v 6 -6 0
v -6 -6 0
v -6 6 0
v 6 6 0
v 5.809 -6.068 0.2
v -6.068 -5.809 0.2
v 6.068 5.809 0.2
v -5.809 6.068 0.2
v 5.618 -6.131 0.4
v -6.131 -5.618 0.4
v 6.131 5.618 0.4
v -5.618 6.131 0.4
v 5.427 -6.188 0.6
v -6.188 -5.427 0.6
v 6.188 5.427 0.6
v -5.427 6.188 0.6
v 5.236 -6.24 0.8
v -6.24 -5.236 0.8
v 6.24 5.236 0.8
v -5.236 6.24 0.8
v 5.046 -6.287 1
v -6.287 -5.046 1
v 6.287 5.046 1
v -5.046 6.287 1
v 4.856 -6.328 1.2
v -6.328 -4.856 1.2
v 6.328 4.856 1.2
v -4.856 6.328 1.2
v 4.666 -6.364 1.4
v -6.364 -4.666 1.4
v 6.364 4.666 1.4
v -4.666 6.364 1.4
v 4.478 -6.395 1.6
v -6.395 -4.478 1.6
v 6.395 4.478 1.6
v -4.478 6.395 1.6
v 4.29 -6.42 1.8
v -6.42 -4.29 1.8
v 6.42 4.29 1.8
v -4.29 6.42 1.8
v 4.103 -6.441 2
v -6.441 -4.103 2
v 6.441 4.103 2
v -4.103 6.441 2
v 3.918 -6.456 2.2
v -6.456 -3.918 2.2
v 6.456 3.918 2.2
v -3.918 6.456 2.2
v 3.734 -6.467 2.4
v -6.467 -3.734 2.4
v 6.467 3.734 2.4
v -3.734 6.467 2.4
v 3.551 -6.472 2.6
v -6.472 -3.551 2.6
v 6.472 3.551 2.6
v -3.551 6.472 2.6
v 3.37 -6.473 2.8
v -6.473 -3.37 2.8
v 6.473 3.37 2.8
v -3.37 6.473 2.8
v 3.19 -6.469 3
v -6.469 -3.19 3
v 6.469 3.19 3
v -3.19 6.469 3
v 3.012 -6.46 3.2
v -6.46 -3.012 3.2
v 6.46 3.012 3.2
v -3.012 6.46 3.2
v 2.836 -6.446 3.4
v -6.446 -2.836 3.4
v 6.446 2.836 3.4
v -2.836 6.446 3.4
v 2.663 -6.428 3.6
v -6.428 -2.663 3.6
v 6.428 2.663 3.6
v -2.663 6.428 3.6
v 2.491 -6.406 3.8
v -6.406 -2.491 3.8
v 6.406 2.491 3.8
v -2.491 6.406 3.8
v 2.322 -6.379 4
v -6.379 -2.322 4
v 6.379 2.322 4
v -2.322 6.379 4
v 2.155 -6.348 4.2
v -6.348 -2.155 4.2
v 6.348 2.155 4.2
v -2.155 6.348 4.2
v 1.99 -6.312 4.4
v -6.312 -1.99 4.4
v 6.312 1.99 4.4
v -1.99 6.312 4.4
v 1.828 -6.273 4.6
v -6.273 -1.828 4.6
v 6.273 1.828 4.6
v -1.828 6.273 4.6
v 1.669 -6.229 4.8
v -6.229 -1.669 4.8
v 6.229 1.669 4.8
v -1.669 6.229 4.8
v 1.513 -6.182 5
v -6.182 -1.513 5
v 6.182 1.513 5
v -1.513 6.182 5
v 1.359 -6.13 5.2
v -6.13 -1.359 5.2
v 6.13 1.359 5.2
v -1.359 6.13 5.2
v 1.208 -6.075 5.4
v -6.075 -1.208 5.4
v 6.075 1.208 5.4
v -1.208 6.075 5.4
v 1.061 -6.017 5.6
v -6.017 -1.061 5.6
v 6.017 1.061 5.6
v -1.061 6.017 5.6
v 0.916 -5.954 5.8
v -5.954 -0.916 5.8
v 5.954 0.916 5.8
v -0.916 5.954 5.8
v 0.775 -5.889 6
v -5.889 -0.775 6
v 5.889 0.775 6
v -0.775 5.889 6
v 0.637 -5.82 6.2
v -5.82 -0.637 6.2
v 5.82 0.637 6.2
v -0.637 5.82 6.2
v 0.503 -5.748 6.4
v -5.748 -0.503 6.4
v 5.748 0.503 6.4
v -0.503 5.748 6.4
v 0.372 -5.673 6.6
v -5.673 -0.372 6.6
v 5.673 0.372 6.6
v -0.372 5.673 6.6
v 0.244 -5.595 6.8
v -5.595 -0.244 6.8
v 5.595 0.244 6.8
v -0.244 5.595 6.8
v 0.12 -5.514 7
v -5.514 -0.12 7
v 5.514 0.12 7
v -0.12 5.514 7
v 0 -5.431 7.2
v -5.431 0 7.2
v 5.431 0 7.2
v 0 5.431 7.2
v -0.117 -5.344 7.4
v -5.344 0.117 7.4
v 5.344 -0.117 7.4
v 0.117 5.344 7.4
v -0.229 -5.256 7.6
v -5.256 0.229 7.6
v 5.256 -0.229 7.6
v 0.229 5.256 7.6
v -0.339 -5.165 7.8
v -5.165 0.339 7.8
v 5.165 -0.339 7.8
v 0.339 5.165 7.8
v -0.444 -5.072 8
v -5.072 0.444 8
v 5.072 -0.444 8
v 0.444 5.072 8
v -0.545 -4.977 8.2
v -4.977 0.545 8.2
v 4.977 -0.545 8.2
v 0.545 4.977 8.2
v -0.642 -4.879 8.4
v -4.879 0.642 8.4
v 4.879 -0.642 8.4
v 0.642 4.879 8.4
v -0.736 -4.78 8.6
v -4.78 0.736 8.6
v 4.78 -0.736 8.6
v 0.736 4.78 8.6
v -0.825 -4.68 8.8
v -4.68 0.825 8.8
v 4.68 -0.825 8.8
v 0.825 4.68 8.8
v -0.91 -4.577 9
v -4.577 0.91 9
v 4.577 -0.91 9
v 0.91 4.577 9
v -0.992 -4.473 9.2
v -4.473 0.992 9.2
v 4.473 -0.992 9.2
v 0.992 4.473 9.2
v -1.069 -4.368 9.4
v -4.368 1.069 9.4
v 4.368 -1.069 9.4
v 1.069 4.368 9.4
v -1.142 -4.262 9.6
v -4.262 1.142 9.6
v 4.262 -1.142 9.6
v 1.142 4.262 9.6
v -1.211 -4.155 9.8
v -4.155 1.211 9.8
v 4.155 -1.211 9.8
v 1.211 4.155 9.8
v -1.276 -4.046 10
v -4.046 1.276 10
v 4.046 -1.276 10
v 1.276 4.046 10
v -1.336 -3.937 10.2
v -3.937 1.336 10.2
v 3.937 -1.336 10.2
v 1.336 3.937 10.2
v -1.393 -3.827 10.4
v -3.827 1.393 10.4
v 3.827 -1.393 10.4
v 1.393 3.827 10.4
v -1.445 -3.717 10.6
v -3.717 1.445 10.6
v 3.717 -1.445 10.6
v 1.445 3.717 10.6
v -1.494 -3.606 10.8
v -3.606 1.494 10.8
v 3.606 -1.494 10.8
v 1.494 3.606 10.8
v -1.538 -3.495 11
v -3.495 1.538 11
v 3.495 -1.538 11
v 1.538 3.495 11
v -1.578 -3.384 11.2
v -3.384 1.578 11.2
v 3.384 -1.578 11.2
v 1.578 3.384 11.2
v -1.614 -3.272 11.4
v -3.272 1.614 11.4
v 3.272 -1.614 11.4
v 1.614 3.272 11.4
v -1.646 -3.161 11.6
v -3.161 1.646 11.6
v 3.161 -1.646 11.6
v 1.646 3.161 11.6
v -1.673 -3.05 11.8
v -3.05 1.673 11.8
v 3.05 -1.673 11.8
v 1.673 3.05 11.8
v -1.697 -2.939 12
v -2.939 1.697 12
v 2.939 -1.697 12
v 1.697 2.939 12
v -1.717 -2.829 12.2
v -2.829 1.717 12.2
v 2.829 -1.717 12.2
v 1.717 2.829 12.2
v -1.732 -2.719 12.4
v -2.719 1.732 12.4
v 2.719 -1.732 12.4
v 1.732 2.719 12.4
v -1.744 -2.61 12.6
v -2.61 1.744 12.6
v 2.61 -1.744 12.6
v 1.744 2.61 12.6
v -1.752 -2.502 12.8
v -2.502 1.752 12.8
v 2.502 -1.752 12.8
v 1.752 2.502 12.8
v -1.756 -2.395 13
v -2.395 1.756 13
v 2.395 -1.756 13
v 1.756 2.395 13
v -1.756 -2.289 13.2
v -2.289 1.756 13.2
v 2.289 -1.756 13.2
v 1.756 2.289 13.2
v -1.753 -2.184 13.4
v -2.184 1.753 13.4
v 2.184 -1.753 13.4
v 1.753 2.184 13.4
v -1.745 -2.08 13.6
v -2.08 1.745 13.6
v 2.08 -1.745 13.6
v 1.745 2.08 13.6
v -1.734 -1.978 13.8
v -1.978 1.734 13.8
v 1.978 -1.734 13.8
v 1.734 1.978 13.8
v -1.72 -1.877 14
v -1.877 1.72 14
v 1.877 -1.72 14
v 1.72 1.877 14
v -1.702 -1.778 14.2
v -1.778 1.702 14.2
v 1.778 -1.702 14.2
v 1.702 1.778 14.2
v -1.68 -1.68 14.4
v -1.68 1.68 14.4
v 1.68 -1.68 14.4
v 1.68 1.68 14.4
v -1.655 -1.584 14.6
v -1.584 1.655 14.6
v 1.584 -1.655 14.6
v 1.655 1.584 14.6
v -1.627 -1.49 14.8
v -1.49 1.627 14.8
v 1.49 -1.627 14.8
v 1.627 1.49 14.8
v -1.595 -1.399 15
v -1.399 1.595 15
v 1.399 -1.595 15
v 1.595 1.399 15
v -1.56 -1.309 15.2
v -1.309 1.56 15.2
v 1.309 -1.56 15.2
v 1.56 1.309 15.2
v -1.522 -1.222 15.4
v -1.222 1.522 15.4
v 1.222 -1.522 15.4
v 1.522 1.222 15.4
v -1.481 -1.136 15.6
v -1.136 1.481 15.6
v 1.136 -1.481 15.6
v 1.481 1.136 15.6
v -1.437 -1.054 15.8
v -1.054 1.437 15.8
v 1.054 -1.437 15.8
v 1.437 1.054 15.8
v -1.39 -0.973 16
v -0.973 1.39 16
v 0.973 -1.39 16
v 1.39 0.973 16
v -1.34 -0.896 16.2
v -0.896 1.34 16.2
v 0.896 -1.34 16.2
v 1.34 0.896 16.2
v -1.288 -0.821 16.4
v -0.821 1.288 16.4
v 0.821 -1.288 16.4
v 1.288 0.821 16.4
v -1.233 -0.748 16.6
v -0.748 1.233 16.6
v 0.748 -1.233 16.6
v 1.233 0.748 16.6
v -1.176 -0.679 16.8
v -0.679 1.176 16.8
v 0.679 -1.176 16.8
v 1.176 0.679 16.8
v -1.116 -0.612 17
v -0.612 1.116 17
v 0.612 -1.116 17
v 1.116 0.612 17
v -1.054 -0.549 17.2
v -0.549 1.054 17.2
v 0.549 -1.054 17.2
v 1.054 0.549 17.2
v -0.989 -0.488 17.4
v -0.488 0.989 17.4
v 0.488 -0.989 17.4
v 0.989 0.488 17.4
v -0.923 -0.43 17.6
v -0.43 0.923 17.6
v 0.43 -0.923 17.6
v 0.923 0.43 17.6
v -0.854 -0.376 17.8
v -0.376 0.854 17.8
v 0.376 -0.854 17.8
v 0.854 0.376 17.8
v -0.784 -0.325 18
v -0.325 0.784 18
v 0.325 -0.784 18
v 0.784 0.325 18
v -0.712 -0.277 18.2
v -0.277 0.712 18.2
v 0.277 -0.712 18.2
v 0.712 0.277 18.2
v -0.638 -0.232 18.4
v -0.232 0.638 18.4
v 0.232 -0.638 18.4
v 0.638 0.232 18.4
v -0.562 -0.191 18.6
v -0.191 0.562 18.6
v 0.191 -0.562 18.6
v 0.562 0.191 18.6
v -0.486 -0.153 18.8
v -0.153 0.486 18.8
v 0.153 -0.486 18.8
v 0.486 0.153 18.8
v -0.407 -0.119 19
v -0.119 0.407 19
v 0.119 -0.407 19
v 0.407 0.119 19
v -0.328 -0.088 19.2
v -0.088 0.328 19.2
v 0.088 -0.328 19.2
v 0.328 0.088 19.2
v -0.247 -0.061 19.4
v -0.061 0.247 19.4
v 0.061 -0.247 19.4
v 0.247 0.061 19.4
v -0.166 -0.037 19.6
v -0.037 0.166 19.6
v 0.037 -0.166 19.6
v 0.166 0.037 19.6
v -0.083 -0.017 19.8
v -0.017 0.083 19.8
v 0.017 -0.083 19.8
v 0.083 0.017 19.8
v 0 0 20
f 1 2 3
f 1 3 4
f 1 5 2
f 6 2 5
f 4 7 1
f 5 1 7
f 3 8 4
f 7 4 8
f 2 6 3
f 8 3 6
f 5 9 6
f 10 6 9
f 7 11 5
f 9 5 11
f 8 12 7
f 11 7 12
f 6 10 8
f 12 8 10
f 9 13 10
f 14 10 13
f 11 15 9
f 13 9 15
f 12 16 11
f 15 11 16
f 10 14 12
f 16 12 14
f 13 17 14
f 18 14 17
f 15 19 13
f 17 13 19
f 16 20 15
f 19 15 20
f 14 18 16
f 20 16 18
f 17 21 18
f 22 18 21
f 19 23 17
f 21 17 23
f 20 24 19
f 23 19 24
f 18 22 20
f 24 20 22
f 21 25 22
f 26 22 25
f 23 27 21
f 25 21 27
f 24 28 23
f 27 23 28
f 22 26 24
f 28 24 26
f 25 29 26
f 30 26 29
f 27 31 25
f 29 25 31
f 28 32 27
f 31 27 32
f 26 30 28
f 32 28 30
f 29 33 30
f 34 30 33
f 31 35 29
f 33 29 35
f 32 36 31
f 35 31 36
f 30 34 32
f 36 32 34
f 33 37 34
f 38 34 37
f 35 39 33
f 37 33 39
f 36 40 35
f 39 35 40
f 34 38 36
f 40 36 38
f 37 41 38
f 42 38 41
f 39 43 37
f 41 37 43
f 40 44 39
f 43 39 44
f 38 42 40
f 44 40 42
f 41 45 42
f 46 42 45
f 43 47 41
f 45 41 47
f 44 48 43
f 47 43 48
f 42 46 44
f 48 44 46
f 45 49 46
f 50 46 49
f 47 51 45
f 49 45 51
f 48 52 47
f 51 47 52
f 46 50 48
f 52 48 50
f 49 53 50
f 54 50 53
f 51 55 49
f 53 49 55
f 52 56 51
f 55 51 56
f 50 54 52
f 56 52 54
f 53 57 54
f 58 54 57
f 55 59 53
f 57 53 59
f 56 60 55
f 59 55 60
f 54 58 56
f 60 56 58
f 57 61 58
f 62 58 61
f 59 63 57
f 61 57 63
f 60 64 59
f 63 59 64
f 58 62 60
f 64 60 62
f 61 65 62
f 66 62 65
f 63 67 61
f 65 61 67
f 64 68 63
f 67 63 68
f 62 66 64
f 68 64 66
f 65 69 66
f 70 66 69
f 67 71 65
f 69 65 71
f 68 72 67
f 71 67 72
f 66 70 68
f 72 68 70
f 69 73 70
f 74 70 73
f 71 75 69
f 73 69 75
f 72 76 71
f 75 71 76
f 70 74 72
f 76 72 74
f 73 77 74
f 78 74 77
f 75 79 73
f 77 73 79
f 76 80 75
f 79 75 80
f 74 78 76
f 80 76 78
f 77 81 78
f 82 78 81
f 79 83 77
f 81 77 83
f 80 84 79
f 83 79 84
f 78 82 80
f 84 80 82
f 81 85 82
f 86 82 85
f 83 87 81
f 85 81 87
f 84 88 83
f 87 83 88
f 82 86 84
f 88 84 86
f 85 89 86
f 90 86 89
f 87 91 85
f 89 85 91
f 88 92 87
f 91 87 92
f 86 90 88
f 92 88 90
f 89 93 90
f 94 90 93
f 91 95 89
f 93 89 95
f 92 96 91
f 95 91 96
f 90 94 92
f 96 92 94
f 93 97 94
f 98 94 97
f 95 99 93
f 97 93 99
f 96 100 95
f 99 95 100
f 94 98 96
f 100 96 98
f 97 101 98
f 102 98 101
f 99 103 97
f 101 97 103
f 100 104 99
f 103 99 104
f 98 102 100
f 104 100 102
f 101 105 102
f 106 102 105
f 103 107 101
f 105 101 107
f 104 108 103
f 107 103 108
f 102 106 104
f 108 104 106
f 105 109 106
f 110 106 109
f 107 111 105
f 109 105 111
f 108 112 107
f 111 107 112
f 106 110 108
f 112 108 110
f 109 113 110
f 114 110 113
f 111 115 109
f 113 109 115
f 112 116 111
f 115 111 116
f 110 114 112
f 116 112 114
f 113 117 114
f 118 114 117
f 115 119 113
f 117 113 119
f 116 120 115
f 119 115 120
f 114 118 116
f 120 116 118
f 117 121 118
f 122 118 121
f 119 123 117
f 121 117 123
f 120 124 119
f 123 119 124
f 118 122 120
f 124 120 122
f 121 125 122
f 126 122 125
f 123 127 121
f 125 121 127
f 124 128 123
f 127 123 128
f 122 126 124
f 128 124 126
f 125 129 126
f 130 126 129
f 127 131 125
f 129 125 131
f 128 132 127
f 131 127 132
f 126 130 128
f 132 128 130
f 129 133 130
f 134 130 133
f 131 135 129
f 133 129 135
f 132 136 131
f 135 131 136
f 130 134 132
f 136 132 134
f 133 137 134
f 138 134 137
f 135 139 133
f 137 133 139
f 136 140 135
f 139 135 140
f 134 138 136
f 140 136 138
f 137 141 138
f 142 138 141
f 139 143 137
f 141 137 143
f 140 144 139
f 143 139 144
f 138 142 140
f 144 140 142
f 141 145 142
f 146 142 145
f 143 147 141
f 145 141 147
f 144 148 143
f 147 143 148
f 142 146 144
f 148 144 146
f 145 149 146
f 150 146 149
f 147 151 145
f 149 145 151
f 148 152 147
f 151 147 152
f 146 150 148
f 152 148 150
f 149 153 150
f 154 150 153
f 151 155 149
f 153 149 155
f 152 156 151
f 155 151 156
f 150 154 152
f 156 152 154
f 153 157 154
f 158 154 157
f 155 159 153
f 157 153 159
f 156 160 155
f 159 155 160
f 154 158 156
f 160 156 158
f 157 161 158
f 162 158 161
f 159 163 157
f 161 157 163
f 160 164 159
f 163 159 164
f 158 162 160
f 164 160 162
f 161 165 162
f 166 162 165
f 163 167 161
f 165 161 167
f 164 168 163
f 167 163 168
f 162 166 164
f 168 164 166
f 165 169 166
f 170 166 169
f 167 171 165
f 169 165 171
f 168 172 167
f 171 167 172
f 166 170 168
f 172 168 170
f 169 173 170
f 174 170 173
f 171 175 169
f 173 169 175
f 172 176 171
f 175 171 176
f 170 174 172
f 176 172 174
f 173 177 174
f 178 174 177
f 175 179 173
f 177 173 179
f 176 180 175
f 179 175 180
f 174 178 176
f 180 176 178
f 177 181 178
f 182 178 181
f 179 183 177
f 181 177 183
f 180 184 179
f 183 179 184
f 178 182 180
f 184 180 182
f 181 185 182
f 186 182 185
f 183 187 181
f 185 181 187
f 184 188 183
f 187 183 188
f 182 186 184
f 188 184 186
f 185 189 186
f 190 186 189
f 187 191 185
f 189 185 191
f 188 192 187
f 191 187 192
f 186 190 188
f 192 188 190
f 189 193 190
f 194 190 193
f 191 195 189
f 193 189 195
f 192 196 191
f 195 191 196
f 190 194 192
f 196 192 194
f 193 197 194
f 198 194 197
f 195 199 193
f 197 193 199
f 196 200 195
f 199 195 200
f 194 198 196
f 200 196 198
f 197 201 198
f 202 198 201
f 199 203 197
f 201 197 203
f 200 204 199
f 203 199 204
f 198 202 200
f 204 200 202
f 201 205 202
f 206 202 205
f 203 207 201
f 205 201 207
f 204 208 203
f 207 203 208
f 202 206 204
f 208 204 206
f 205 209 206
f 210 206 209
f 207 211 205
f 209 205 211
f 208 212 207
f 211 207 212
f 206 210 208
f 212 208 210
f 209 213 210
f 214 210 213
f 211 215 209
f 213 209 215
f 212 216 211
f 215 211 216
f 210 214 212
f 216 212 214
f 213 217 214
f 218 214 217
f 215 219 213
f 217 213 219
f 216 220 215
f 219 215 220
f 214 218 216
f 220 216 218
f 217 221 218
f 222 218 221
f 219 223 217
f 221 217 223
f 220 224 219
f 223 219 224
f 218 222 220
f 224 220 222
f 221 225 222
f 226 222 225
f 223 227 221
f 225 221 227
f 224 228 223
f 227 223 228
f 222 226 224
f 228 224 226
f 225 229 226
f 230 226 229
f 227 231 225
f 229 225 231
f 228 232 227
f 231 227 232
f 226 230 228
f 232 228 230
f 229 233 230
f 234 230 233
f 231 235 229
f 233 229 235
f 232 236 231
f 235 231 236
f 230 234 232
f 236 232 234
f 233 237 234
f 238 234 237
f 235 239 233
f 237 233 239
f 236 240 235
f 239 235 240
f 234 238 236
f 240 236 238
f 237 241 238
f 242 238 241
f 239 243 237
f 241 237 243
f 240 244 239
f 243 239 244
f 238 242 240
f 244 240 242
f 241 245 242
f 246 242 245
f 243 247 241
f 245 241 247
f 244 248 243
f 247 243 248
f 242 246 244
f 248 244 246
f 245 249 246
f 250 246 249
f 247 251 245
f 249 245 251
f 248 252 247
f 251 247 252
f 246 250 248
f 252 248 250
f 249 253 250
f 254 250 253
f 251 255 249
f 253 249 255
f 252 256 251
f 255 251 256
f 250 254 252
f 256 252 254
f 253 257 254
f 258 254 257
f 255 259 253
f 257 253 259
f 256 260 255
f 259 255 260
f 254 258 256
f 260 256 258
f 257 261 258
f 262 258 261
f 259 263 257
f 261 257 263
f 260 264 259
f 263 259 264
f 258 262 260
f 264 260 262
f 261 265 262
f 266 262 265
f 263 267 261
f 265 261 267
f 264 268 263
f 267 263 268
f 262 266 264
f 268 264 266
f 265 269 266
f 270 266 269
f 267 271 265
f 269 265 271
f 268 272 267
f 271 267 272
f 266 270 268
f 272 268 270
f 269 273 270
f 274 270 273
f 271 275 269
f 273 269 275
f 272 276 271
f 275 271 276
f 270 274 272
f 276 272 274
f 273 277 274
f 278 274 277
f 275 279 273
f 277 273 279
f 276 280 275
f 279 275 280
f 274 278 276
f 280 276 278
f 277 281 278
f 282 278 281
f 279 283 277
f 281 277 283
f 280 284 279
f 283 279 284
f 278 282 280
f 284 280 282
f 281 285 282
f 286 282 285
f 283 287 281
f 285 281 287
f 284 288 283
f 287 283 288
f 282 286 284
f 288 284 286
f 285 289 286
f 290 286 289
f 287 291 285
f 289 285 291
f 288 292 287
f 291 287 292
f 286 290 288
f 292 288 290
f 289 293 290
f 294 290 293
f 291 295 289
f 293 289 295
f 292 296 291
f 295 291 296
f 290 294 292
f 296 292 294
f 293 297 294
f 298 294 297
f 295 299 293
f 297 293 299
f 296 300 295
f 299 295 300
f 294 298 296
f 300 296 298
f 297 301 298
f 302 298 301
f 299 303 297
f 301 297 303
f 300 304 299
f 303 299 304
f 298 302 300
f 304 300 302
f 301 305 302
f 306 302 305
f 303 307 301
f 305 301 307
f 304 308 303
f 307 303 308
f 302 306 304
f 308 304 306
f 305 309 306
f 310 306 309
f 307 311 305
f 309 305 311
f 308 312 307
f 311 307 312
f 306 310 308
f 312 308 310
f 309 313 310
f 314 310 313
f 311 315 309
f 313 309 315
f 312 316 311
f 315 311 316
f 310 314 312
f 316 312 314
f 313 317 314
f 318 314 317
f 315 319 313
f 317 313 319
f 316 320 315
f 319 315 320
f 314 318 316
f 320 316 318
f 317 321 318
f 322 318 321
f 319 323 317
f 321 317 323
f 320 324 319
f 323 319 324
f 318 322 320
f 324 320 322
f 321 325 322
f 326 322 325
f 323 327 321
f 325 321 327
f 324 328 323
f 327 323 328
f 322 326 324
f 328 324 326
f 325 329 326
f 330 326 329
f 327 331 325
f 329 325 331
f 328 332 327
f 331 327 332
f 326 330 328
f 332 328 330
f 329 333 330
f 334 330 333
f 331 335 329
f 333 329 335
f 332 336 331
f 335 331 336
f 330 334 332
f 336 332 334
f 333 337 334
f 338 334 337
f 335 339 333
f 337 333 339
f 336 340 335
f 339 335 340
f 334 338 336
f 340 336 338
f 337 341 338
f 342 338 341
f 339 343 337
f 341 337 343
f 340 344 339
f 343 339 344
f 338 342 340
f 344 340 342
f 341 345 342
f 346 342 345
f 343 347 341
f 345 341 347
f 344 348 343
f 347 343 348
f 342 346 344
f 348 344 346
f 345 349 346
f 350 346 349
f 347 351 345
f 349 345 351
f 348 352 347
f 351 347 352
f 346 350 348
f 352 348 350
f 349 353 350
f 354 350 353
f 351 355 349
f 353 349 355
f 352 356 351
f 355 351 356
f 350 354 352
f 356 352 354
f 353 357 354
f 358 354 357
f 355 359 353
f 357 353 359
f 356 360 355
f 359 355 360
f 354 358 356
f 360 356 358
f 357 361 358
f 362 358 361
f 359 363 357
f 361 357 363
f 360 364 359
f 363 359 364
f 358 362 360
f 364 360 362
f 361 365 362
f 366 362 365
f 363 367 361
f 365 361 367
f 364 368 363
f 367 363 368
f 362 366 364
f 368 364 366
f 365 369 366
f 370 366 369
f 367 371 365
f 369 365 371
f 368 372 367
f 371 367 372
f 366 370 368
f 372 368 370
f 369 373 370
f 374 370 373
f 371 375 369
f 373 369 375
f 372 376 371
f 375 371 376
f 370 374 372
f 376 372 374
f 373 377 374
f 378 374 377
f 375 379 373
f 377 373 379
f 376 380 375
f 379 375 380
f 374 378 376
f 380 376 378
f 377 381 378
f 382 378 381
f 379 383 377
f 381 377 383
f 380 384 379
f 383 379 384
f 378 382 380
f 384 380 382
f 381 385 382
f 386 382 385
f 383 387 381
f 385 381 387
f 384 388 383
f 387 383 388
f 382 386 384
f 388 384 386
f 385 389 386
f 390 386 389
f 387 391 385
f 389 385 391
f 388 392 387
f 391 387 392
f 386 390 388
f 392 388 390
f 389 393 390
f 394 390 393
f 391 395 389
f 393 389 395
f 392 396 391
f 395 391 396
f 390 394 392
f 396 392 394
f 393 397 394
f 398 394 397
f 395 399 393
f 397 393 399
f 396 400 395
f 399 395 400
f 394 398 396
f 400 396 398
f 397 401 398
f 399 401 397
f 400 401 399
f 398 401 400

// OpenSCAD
//linear_extrude(height=20,twist=45) square(12,center=true);

//linear_extrude(height=20,twist=720) square(12,center=true);

linear_extrude(height=20,twist=125,slices=100, $fn=100, scale=0)
    square(12,center=true);
